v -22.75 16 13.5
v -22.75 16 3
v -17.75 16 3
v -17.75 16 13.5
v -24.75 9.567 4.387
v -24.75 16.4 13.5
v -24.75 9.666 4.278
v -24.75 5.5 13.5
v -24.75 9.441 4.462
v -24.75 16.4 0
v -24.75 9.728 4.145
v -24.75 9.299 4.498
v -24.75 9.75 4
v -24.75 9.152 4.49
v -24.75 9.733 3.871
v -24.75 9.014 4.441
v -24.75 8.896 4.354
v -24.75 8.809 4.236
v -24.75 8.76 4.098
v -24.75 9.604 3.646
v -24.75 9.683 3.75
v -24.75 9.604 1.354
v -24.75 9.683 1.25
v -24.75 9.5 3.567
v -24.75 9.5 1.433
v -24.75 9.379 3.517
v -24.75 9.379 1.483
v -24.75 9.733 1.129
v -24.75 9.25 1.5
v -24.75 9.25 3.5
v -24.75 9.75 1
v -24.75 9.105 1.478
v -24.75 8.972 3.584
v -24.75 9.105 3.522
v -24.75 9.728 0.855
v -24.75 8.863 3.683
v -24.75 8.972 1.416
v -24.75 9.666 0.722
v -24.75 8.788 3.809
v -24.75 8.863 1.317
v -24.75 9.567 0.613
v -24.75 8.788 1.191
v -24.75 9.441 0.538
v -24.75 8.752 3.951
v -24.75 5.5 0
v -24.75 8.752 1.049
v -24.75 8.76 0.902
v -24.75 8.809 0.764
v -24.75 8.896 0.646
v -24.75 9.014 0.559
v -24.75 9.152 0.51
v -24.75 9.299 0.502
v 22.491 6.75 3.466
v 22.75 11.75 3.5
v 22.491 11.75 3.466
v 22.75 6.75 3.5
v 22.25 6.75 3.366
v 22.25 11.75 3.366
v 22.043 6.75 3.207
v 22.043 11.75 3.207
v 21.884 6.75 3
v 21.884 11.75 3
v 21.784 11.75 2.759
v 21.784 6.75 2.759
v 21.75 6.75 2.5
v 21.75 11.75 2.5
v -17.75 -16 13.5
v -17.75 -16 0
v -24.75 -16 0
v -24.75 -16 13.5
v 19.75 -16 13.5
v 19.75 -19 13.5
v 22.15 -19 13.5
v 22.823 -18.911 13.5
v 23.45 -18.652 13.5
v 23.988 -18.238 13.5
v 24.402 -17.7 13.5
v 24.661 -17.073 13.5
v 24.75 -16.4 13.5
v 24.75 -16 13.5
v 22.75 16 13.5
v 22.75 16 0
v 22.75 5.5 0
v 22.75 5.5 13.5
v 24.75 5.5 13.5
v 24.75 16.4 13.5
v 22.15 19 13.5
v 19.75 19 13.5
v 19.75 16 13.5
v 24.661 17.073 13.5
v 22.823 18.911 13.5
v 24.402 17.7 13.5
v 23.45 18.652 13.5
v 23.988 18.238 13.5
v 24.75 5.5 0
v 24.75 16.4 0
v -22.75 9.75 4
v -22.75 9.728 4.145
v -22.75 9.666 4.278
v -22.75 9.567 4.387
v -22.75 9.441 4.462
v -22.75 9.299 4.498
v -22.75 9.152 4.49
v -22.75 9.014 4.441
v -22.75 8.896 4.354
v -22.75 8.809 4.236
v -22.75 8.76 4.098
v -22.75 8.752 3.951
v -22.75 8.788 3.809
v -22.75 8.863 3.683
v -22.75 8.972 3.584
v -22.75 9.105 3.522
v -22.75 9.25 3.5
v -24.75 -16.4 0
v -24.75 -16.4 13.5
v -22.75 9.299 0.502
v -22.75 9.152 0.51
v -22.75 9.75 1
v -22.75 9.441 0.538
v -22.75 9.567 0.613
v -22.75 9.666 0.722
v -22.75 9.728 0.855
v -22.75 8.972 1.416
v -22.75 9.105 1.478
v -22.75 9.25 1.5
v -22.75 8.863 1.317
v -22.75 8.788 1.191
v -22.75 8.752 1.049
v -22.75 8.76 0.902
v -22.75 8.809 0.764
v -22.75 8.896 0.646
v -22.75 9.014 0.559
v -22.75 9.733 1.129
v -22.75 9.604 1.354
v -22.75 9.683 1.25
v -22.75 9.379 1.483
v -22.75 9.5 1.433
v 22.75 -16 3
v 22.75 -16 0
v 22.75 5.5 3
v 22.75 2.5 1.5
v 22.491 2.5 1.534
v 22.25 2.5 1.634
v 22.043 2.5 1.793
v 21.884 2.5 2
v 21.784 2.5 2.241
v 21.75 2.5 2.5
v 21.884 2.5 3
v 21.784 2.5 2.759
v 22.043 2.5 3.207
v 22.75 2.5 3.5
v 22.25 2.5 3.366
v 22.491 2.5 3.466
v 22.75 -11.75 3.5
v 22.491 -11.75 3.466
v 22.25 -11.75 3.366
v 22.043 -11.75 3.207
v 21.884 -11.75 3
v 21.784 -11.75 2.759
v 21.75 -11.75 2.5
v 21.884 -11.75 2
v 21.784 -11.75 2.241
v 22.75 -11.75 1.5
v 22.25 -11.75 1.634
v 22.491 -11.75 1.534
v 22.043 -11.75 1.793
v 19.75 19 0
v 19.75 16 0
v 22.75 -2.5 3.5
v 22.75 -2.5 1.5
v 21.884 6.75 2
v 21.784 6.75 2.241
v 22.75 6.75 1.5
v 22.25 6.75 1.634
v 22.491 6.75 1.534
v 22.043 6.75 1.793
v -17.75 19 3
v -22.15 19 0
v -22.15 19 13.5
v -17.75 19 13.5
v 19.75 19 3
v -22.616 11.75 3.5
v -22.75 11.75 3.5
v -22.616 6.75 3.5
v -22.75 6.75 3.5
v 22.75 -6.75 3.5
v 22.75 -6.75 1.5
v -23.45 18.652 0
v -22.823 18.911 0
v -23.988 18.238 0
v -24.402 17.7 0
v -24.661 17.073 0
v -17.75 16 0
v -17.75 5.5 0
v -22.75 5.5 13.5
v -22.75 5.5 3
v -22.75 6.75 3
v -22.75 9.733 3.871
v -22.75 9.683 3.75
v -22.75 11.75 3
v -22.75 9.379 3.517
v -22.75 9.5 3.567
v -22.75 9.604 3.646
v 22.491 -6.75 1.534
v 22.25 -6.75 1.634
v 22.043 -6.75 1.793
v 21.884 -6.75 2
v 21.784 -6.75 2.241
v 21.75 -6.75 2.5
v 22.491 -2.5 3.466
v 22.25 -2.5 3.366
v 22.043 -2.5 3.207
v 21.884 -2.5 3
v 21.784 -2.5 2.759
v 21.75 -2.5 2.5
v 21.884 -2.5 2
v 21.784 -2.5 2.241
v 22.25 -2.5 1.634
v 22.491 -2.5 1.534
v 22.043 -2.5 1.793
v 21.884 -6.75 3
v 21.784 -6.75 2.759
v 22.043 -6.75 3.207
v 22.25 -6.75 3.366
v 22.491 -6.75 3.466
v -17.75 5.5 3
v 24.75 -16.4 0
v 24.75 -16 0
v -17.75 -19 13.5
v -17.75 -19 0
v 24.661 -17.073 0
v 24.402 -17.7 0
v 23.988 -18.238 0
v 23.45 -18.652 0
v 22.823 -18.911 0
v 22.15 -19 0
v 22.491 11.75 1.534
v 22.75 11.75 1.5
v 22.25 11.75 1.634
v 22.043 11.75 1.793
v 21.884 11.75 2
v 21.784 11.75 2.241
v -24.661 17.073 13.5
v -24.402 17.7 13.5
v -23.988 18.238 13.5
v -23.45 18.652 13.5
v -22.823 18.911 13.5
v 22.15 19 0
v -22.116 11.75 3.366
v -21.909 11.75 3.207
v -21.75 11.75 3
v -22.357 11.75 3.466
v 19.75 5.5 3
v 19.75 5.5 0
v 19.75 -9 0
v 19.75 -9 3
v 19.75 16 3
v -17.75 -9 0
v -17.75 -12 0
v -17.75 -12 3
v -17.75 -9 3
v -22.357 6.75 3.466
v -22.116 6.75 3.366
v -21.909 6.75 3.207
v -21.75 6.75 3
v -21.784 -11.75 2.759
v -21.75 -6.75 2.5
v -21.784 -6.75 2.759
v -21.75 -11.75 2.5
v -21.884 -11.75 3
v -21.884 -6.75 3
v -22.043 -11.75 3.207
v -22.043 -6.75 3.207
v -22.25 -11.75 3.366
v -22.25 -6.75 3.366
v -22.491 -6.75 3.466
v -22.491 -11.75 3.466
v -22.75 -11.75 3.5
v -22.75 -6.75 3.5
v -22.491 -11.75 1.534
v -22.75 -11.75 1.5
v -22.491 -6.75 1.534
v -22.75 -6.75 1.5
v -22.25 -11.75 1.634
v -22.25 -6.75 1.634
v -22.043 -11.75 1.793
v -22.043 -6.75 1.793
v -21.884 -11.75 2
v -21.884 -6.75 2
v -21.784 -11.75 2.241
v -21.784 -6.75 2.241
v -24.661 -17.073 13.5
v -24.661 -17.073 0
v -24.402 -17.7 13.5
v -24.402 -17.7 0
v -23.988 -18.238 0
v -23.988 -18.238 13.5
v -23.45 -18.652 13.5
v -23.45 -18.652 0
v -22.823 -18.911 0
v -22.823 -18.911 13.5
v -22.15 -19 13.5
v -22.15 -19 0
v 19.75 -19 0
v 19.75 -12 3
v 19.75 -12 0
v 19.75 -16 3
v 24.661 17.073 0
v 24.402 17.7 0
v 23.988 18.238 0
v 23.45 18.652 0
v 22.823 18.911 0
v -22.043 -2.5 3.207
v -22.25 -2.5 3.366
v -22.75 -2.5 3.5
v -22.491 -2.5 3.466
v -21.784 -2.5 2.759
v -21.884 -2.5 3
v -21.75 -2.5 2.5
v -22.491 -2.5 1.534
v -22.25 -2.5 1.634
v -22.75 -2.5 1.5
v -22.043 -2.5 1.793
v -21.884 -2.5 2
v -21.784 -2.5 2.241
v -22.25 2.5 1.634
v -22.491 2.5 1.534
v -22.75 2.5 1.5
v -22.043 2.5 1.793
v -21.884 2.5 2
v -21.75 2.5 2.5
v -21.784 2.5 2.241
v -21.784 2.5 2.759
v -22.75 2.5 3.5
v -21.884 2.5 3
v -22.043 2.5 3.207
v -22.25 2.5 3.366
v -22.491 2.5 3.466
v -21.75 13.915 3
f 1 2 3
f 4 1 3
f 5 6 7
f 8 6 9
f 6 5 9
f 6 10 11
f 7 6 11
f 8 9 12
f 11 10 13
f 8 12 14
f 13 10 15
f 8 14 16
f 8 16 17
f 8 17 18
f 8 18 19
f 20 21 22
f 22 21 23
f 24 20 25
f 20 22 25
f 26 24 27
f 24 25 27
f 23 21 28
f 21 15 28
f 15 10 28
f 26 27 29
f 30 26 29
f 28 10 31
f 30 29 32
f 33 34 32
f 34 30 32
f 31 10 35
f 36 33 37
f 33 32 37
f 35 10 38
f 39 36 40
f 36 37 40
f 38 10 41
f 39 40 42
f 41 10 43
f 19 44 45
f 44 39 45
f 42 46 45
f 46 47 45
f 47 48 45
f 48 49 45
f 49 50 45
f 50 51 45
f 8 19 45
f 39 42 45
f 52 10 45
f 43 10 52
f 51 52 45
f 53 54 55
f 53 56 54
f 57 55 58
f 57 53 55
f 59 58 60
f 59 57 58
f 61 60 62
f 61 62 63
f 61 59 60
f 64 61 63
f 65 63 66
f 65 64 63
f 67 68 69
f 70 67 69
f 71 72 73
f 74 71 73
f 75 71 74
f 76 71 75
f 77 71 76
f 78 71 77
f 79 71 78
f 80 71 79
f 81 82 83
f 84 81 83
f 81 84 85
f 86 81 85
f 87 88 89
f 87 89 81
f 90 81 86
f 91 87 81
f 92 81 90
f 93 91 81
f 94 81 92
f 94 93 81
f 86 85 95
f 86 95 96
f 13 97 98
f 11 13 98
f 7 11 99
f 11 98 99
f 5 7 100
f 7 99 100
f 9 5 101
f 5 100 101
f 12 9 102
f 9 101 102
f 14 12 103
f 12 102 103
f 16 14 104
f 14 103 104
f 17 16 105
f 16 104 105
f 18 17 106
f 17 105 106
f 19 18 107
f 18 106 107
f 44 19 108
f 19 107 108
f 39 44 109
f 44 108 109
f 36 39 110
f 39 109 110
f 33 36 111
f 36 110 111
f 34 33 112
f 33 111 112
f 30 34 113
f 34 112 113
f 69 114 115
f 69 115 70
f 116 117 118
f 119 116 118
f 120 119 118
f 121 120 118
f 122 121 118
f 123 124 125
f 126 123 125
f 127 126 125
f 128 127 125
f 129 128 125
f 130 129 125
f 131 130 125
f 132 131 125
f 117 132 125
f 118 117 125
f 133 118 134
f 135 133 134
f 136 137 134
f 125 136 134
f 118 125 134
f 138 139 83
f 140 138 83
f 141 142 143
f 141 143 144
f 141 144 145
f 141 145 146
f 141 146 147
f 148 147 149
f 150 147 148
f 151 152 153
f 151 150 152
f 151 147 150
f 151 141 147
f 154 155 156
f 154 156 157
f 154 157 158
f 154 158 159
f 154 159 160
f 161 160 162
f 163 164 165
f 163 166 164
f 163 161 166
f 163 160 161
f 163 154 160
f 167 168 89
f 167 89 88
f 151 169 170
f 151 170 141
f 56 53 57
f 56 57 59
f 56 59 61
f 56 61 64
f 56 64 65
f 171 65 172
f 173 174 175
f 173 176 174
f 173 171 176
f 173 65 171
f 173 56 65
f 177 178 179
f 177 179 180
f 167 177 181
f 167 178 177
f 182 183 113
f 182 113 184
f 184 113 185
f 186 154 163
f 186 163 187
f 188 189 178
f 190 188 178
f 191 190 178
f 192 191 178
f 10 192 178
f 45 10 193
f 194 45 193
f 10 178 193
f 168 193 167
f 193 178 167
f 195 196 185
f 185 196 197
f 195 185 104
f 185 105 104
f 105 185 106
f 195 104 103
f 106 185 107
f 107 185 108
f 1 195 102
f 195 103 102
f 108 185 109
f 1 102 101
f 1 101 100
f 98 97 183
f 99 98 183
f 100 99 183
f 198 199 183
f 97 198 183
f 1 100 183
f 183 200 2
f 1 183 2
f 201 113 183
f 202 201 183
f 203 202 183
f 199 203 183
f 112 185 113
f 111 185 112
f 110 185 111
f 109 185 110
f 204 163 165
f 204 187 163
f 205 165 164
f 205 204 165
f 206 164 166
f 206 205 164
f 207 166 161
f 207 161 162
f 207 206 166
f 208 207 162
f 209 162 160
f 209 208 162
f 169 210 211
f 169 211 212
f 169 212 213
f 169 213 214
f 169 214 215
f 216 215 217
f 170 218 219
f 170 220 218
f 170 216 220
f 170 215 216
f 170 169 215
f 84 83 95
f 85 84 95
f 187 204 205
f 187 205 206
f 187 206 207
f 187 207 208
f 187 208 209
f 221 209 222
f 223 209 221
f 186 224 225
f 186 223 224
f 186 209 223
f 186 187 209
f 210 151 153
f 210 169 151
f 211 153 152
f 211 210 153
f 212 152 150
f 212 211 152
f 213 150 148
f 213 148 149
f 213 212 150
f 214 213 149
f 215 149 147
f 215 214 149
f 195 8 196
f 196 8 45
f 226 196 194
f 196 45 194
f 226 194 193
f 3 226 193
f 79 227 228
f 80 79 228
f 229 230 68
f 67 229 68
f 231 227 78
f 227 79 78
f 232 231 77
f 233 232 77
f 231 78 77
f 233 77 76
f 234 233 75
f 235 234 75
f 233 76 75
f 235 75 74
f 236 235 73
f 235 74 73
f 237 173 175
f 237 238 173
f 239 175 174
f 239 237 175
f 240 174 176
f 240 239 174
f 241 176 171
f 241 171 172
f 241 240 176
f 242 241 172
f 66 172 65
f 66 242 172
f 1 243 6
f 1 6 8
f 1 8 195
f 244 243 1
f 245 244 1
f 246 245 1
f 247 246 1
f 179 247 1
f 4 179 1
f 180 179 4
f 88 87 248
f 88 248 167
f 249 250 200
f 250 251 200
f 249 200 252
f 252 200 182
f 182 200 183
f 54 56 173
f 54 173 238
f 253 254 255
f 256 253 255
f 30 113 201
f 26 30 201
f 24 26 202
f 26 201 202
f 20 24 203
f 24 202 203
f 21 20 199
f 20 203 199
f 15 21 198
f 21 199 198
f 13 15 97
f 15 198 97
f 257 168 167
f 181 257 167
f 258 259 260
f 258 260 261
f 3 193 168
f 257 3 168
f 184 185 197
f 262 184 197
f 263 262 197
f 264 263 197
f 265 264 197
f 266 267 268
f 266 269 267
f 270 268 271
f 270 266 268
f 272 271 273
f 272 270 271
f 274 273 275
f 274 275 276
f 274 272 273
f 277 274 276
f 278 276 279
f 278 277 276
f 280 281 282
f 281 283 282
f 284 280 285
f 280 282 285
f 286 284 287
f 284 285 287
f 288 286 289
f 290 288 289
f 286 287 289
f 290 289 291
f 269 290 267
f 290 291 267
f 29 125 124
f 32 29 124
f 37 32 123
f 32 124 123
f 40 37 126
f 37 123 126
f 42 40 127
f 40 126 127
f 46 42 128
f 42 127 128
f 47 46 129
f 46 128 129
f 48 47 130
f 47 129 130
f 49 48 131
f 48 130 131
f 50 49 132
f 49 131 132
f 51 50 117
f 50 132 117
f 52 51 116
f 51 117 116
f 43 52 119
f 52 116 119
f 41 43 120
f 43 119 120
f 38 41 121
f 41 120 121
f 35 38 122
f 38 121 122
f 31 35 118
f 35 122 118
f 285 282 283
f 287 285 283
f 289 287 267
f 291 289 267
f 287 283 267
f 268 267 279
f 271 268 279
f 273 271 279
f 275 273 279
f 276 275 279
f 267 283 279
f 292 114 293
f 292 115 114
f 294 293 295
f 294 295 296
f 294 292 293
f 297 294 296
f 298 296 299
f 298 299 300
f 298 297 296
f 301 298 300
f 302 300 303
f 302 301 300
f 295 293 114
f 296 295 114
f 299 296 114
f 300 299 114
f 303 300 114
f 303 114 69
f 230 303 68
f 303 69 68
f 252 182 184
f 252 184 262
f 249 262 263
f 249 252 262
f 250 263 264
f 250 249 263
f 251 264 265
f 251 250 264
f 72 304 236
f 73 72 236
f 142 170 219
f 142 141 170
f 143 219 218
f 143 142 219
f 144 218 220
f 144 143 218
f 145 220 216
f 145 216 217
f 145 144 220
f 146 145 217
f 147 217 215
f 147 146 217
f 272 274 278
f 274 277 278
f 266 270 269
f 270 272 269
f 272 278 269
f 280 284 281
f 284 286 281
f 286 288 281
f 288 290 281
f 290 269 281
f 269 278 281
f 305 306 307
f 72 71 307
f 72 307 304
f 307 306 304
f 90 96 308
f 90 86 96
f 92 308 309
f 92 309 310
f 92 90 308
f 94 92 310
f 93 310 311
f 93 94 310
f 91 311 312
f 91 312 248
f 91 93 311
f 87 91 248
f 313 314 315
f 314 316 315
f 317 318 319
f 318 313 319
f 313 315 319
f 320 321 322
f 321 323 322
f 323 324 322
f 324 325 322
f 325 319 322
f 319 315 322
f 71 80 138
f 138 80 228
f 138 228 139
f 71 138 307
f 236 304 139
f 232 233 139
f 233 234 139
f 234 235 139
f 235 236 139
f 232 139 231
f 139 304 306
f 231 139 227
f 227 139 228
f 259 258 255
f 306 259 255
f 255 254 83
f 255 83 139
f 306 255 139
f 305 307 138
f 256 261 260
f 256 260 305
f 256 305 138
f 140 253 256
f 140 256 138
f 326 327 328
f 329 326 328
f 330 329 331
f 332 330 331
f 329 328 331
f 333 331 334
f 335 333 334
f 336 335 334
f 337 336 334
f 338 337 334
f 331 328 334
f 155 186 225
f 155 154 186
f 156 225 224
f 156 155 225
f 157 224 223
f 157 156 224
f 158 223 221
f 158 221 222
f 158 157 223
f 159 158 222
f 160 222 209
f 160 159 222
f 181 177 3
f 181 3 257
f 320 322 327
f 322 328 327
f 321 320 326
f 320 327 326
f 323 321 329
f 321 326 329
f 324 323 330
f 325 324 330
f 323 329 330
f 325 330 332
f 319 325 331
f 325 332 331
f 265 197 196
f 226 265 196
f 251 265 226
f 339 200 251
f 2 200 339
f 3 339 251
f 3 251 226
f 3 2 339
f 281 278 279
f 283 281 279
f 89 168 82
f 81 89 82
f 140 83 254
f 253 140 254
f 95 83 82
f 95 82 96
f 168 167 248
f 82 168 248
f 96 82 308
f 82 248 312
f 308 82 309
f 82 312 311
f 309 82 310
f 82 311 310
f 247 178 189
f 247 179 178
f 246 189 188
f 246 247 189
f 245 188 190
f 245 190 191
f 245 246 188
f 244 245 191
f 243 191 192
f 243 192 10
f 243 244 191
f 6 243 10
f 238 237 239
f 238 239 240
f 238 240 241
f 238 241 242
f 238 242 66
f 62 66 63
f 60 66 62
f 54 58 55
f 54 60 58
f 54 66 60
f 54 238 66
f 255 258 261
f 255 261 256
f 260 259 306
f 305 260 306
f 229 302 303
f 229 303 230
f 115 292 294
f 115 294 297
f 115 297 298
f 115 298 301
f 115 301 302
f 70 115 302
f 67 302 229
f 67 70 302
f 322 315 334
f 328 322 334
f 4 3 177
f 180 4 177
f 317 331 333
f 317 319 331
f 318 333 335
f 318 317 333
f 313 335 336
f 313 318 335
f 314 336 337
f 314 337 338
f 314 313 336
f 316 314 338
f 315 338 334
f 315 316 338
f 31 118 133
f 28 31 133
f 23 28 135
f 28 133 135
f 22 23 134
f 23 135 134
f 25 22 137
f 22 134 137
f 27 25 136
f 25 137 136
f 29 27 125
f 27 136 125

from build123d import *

# Parameters (mm, degrees)
F0_W         = 2
F0_H         = 10.5
F0_H_2       = 3
F0_W_2       = 5
F1_DEPTH     = 13.5
F0_W_3       = 3
F0_W_4       = 37.5
F2_DEPTH     = 3
F3_R         = 2.6
F3_2_R       = 2.6
F3_3_R       = 2.6
F3_4_R       = 2.6
F6_DEPTH     = 1
F7_R         = 0.99999
F7_2_R       = 0.99999
F7_3_R       = 0.99999
F10_DEPTH    = 1
F11_T1_DEPTH = 9.3301270189
F11_2_F1_R   = 0.9999
F11_2_F2_R   = 0.9999
F11_3_F1_R   = 0.9999
F11_3_F2_R   = 0.9999
F12_DEPTH    = 5
F13_DEPTH    = 5


# Not quite as in the source:
# - a fillet or chamfer that OpenCascade refuses, or shapes differently, is made with other operations: its cross-section is extruded or revolved along the edge and cut away or added
# - a fillet or chamfer is up to 0.001 mm smaller than in the source, because OpenCascade refuses the exact size
# - a feature of the source that left no trace in its solid (it failed there, or was rolled back) is left out
# - a feature names something its author has since deleted; it is built from what else it names


with BuildPart() as f1:
    # F0 (on Top) → F1 (new body)
    with BuildSketch(Plane.XY):
        with Locations((-23.75, 10.75)):
            Rectangle(F0_W, F0_H)
        with Locations((-23.75, 17.5)):
            Rectangle(F0_W, F0_H_2)
        with Locations((-20.25, 17.5)):
            Rectangle(F0_W_2, F0_H_2)
    extrude(amount=F1_DEPTH)

    # F0 (on Top) → F2 (join)
    with BuildSketch(Plane.XY):
        with Locations((1, 17.5)):
            Rectangle(F0_W_4, F0_H_2)
        with Locations((-20.25, 10.75)):
            Rectangle(F0_W_2, F0_H)
    extrude(amount=F2_DEPTH)

    # F3
    f3_edges = [f1.edges().sort_by_distance(p)[0] for p in [
        (-24.75, 19, 6.75),
    ]]
    fillet(f3_edges, radius=F3_R)

    # F9 (on face) → F10, piece 3 (join)
    with BuildSketch(Plane.YZ.offset(-22.75)):
        Polygon((6.75, 3.5), (6.75, 1.5), (9.25, 1.5), (11.75, 1.5), (11.75, 3.5), (9.25, 3.5), align=None)
    extrude(amount=F10_DEPTH)

    # F11: fillet of radius 1 on 1 edges, made by hand

    # F11_s2 → F11_t1 (cut)
    with BuildSketch(Plane.XZ.offset(-13.9150635095)):
        with BuildLine():
            ThreePointArc((-22.6160254038, 3.5), (-22.1160254038, 3.3660254038), (-21.75, 3))
            Line((-21.75, 3), (-21.75, 3.5))
            Line((-21.75, 3.5), (-22.6160254038, 3.5))
        make_face()
    extrude(amount=F11_T1_DEPTH, mode=Mode.SUBTRACT)

    # F5 (on face) → F12 (cut)
    with BuildSketch(Plane.YZ.offset(22.75)):
        with BuildLine():
            ThreePointArc((-8.75, 4), (-9.6035533906, 4.3535533906), (-9.25, 3.5))
            ThreePointArc((-9.25, 3.5), (-8.8964466094, 3.6464466094), (-8.75, 4))
        make_face()
        with BuildLine():
            ThreePointArc((-8.75, 1), (-8.8964466094, 1.3535533906), (-9.25, 1.5))
            ThreePointArc((-9.25, 1.5), (-9.6035533906, 0.6464466094), (-8.75, 1))
        make_face()
        with BuildLine():
            ThreePointArc((0.5, 4), (-0.3535533906, 4.3535533906), (0, 3.5))
            ThreePointArc((0, 3.5), (0.3535533906, 3.6464466094), (0.5, 4))
        make_face()
        with BuildLine():
            ThreePointArc((0.5, 1), (0.3535533906, 1.3535533906), (0, 1.5))
            ThreePointArc((0, 1.5), (-0.3535533906, 0.6464466094), (0.5, 1))
        make_face()
    extrude(amount=F12_DEPTH, mode=Mode.SUBTRACT)

    # F9 (on face) → F13 (cut)
    with BuildSketch(Plane.YZ.offset(-22.75)):
        with BuildLine():
            ThreePointArc((-8.75, 4), (-9.6035533906, 4.3535533906), (-9.25, 3.5))
            ThreePointArc((-9.25, 3.5), (-8.8964466094, 3.6464466094), (-8.75, 4))
        make_face()
        with BuildLine():
            ThreePointArc((0.5, 4), (-0.3535533906, 4.3535533906), (0, 3.5))
            ThreePointArc((0, 3.5), (0.3535533906, 3.6464466094), (0.5, 4))
        make_face()
        with BuildLine():
            ThreePointArc((9.75, 4), (8.8964466094, 4.3535533906), (9.25, 3.5))
            ThreePointArc((9.25, 3.5), (9.6035533906, 3.6464466094), (9.75, 4))
        make_face()
        with BuildLine():
            ThreePointArc((9.75, 1), (9.6035533906, 1.3535533906), (9.25, 1.5))
            ThreePointArc((9.25, 1.5), (8.8964466094, 0.6464466094), (9.75, 1))
        make_face()
        with BuildLine():
            ThreePointArc((0.5, 1), (0.3535533906, 1.3535533906), (0, 1.5))
            ThreePointArc((0, 1.5), (-0.3535533906, 0.6464466094), (0.5, 1))
        make_face()
        with BuildLine():
            ThreePointArc((-8.75, 1), (-8.8964466094, 1.3535533906), (-9.25, 1.5))
            ThreePointArc((-9.25, 1.5), (-9.6035533906, 0.6464466094), (-8.75, 1))
        make_face()
    extrude(amount=-F13_DEPTH, mode=Mode.SUBTRACT)


with BuildPart() as f1b:
    # F0 (on Top) → F1, piece 2 (new body)
    with BuildSketch(Plane.XY):
        with Locations((-23.75, -17.5)):
            Rectangle(F0_W, F0_H_2)
        with Locations((-20.25, -17.5)):
            Rectangle(F0_W_2, F0_H_2)
    extrude(amount=F1_DEPTH)

    # F3#2
    f3_2_edges = [f1b.edges().sort_by_distance(p)[0] for p in [
        (-24.75, -19, 6.75),
    ]]
    fillet(f3_2_edges, radius=F3_2_R)


with BuildPart() as f1c:
    # F0 (on Top) → F1, piece 3 (new body)
    with BuildSketch(Plane.XY):
        with Locations((21.25, -17.5)):
            Rectangle(F0_W_3, F0_H_2)
        with Locations((23.75, -17.5)):
            Rectangle(F0_W, F0_H_2)
    extrude(amount=F1_DEPTH)

    # F0 (on Top) → F2, piece 2 (join)
    with BuildSketch(Plane.XY):
        Polygon((22.75, 5.5), (19.75, 5.5), (19.75, -9), (19.75, -12), (19.75, -16), (22.75, -16), align=None)
        with Locations((1, -10.5)):
            Rectangle(F0_W_4, F0_H_2)
    extrude(amount=F2_DEPTH)

    # F3#3
    f3_3_edges = [f1c.edges().sort_by_distance(p)[0] for p in [
        (24.75, -19, 6.75),
    ]]
    fillet(f3_3_edges, radius=F3_3_R)


with BuildPart() as f1d:
    # F0 (on Top) → F1, piece 4 (new body)
    with BuildSketch(Plane.XY):
        with Locations((23.75, 10.75)):
            Rectangle(F0_W, F0_H)
        with Locations((23.75, 17.5)):
            Rectangle(F0_W, F0_H_2)
        with Locations((21.25, 17.5)):
            Rectangle(F0_W_3, F0_H_2)
    extrude(amount=F1_DEPTH)

    # F3#4
    f3_4_edges = [f1d.edges().sort_by_distance(p)[0] for p in [
        (24.75, 19, 6.75),
    ]]
    fillet(f3_4_edges, radius=F3_4_R)


with BuildPart() as f6:
    # F5 (on face) → F6 (new body)
    with BuildSketch(Plane.YZ.offset(22.75)):
        Polygon((-11.75, 3.5), (-11.75, 1.5), (-9.25, 1.5), (-6.75, 1.5), (-6.75, 3.5), (-9.25, 3.5), align=None)
    extrude(amount=-F6_DEPTH)

    # F7 (radius 1 in the source; OpenCascade refuses exactly that, so slightly less here)
    f7_edges = [f6.edges().sort_by_distance(p)[0] for p in [
        (21.75, -9.25, 3.5),
        (21.75, -9.25, 1.5),
    ]]
    fillet(f7_edges, radius=F7_R)


with BuildPart() as f6b:
    # F5 (on face) → F6, piece 2 (new body)
    with BuildSketch(Plane.YZ.offset(22.75)):
        Polygon((-2.5, 3.5), (-2.5, 1.5), (0, 1.5), (2.5, 1.5), (2.5, 3.5), (0, 3.5), align=None)
    extrude(amount=-F6_DEPTH)

    # F7#2 (radius 1 in the source; OpenCascade refuses exactly that, so slightly less here)
    f7_2_edges = [f6b.edges().sort_by_distance(p)[0] for p in [
        (21.75, 0, 3.5),
        (21.75, 0, 1.5),
    ]]
    fillet(f7_2_edges, radius=F7_2_R)


with BuildPart() as f6c:
    # F5 (on face) → F6, piece 3 (new body)
    with BuildSketch(Plane.YZ.offset(22.75)):
        Polygon((6.75, 3.5), (6.75, 1.5), (9.25, 1.5), (11.75, 1.5), (11.75, 3.5), (9.25, 3.5), align=None)
    extrude(amount=-F6_DEPTH)

    # F7#3 (radius 1 in the source; OpenCascade refuses exactly that, so slightly less here)
    f7_3_edges = [f6c.edges().sort_by_distance(p)[0] for p in [
        (21.75, 9.25, 1.5),
        (21.75, 9.25, 3.5),
    ]]
    fillet(f7_3_edges, radius=F7_3_R)


with BuildPart() as f10:
    # F9 (on face) → F10 (new body)
    with BuildSketch(Plane.YZ.offset(-22.75)):
        Polygon((-11.75, 3.5), (-11.75, 1.5), (-9.25, 1.5), (-6.75, 1.5), (-6.75, 3.5), (-9.25, 3.5), align=None)
    extrude(amount=F10_DEPTH)

    # F11#2: fillet of radius 1 on 2 edges, made by hand

    # F11_2_f1 (radius 1 in the source; OpenCascade refuses exactly that, so slightly less here)
    f11_2_f1_edges = [f10.edges().sort_by_distance(p)[0] for p in [
        (-21.75, -9.25, 1.5),
    ]]
    fillet(f11_2_f1_edges, radius=F11_2_F1_R)

    # F11_2_f2 (radius 1 in the source; OpenCascade refuses exactly that, so slightly less here)
    f11_2_f2_edges = [f10.edges().sort_by_distance(p)[0] for p in [
        (-21.75, -9.25, 3.5),
    ]]
    fillet(f11_2_f2_edges, radius=F11_2_F2_R)


with BuildPart() as f10b:
    # F9 (on face) → F10, piece 2 (new body)
    with BuildSketch(Plane.YZ.offset(-22.75)):
        Polygon((-2.5, 3.5), (-2.5, 1.5), (0, 1.5), (2.5, 1.5), (2.5, 3.5), (0, 3.5), align=None)
    extrude(amount=F10_DEPTH)

    # F11#3: fillet of radius 1 on 2 edges, made by hand

    # F11_3_f1 (radius 1 in the source; OpenCascade refuses exactly that, so slightly less here)
    f11_3_f1_edges = [f10b.edges().sort_by_distance(p)[0] for p in [
        (-21.75, 0, 1.5),
    ]]
    fillet(f11_3_f1_edges, radius=F11_3_F1_R)

    # F11_3_f2 (radius 1 in the source; OpenCascade refuses exactly that, so slightly less here)
    f11_3_f2_edges = [f10b.edges().sort_by_distance(p)[0] for p in [
        (-21.75, 0, 3.5),
    ]]
    fillet(f11_3_f2_edges, radius=F11_3_F2_R)


solid = Compound([f1.part, f1b.part, f1c.part, f1d.part, f6.part, f6b.part, f6c.part, f10.part, f10b.part])
